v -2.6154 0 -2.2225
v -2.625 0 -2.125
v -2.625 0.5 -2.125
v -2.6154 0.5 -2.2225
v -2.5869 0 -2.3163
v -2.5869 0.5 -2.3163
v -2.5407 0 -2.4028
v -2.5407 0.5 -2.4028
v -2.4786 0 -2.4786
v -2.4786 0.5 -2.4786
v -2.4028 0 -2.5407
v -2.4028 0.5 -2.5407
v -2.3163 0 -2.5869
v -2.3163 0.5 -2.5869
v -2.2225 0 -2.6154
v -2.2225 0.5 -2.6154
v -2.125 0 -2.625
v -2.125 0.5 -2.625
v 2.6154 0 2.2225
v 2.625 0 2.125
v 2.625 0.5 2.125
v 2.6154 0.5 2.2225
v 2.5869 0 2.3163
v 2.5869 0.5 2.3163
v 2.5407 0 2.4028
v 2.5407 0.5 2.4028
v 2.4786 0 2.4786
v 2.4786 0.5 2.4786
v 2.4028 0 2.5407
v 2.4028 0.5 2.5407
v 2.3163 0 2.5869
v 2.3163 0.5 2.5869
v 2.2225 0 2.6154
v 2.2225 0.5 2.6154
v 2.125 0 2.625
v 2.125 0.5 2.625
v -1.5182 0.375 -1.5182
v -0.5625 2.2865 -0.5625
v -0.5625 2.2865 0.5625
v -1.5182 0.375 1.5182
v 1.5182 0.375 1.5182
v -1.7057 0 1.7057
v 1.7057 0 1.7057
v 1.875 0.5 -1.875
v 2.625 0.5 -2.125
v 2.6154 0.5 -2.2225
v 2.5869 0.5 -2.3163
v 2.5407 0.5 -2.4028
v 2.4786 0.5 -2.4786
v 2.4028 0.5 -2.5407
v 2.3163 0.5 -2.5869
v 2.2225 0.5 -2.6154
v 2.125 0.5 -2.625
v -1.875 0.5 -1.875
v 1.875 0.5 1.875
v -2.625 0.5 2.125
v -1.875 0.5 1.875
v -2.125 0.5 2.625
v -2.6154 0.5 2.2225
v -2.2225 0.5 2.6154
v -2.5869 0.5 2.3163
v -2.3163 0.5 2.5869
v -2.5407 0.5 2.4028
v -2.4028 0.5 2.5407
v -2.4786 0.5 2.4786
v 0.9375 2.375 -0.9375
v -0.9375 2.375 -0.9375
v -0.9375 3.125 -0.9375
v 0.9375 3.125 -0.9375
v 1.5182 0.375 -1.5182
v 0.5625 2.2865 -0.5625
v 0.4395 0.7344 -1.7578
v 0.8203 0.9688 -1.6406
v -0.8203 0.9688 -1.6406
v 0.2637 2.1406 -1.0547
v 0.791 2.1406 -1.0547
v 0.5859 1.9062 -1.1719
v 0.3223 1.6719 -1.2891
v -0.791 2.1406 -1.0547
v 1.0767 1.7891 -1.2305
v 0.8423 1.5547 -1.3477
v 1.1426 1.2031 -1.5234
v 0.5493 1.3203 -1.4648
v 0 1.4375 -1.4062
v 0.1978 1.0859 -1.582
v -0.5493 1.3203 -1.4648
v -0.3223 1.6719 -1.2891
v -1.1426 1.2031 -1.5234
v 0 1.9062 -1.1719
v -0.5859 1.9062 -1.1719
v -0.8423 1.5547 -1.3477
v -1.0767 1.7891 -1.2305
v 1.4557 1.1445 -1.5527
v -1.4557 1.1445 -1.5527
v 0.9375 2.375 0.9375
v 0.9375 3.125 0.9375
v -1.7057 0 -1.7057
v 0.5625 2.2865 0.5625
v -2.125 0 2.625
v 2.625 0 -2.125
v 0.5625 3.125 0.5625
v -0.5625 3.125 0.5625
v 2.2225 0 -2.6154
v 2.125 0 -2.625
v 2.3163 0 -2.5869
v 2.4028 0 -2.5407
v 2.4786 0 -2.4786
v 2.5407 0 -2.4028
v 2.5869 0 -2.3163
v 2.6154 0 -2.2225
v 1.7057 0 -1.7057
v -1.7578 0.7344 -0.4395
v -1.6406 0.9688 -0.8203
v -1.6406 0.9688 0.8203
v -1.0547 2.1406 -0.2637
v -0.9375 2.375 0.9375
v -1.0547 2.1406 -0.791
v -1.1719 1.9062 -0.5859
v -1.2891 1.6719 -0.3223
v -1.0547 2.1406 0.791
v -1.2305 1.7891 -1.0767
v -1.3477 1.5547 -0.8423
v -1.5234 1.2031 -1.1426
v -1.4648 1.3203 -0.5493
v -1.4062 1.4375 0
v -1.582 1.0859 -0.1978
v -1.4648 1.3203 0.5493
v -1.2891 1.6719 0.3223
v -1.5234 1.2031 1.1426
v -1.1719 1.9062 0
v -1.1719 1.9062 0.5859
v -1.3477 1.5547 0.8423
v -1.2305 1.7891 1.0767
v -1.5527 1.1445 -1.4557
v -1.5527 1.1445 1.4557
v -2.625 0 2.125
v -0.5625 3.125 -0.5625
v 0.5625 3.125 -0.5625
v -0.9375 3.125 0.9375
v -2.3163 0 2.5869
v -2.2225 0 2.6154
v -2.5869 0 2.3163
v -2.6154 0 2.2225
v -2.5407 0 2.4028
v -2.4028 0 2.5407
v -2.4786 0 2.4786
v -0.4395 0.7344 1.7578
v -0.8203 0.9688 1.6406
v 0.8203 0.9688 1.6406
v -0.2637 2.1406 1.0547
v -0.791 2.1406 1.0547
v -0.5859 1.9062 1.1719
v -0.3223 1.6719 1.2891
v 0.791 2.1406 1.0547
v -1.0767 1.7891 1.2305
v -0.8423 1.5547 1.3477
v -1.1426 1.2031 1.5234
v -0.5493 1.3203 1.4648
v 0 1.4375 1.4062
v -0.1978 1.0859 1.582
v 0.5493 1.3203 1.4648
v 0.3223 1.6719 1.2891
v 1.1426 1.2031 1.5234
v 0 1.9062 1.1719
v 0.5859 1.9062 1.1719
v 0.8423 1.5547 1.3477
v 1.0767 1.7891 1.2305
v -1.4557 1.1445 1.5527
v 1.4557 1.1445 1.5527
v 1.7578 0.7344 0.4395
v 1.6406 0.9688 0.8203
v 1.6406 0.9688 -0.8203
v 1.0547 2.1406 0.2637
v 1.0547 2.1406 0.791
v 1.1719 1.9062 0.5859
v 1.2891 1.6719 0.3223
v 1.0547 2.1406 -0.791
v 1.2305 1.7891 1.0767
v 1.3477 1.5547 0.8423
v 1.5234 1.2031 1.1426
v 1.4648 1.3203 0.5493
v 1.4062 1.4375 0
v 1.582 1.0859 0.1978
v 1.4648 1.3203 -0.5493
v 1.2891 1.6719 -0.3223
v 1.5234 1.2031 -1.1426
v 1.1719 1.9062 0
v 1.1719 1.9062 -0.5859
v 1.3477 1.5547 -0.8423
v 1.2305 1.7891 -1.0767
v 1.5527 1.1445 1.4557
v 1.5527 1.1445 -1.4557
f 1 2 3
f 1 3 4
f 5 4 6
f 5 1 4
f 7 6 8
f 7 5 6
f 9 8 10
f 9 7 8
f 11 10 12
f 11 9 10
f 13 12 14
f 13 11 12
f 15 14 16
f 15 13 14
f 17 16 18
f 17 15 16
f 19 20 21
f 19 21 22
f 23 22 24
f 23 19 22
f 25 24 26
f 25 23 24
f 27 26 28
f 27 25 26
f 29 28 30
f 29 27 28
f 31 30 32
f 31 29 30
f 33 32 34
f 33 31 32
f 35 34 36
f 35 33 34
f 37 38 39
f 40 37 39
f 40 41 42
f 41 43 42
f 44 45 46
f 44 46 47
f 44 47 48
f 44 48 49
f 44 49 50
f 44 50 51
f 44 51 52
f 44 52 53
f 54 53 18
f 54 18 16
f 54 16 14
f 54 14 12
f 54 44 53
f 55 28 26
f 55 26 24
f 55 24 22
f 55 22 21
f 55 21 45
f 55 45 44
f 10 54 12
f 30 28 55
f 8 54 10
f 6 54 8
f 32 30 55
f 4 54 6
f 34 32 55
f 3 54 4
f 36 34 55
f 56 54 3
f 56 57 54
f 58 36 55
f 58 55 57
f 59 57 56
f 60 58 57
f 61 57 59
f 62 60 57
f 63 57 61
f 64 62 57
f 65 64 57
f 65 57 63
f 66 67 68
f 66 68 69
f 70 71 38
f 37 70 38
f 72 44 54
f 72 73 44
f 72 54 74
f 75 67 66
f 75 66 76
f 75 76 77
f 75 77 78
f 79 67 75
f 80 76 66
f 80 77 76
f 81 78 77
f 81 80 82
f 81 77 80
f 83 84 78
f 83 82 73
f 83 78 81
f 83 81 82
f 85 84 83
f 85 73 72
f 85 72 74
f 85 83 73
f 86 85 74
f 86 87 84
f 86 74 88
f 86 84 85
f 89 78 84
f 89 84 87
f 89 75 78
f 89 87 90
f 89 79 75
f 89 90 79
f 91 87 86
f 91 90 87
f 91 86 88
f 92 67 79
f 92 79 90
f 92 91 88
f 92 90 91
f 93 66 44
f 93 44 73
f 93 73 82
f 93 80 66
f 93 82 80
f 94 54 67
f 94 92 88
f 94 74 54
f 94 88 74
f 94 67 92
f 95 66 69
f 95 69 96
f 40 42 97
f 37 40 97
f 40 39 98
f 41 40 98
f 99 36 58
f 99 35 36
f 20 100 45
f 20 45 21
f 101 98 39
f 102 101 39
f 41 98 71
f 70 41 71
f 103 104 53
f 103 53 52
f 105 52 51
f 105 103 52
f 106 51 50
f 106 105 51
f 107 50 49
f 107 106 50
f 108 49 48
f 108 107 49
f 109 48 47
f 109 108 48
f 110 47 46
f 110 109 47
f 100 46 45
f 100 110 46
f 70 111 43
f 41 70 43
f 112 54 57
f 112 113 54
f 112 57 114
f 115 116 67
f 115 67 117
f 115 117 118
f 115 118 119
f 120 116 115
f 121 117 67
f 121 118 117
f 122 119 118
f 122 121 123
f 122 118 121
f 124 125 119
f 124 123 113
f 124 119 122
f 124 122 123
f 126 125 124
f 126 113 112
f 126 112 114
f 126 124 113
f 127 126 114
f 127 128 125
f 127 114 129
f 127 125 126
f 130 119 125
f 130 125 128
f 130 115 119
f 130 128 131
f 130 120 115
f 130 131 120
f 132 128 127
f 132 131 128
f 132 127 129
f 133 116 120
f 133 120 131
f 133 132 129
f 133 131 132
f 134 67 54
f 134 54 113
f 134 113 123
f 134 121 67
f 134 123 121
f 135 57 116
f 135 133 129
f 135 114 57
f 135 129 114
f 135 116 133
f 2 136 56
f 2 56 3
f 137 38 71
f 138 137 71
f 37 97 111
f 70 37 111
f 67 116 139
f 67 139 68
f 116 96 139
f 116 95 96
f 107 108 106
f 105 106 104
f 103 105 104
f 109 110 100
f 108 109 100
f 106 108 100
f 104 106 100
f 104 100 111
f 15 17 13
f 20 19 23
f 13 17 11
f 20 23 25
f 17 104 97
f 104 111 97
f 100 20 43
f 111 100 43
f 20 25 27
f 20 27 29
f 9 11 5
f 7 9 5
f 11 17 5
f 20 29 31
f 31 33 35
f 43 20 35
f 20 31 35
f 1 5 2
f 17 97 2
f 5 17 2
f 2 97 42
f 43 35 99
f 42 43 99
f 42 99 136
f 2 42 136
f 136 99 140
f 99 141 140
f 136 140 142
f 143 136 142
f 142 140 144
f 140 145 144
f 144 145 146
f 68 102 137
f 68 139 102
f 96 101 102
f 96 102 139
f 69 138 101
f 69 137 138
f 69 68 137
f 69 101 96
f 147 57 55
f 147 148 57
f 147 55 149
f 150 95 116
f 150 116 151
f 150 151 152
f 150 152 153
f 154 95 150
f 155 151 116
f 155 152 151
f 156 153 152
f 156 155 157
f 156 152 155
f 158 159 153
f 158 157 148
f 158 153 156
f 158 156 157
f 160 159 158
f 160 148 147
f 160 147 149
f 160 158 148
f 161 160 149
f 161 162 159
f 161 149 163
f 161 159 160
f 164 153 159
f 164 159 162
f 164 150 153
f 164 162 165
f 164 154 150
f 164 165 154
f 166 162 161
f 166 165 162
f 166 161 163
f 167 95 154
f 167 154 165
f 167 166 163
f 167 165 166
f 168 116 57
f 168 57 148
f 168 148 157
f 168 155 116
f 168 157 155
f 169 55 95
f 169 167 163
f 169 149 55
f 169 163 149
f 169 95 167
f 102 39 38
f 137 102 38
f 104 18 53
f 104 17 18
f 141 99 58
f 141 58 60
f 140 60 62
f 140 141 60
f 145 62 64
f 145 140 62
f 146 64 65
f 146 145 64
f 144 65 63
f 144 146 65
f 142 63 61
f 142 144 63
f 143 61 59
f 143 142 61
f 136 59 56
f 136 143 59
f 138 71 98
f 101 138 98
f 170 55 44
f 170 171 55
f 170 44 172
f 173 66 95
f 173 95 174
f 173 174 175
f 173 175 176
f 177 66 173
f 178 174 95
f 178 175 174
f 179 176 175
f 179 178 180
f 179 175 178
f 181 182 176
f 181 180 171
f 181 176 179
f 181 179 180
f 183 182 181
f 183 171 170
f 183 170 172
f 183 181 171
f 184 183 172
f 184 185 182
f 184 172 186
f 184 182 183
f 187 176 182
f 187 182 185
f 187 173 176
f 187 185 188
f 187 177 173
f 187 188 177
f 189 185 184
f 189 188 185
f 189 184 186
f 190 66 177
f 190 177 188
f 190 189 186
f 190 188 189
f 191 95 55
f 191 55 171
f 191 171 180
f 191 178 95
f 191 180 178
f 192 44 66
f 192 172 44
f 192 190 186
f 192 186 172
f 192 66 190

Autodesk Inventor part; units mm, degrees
ref_plane "YZ Plane" through (0, 0, 0) normal (1, 0, 0) x (0, 1, 0)
ref_plane "XZ Plane" through (0, 0, 0) normal (0, 1, 0) x (-1, 0, 0)
sketch "Boceto1" plane through (0, 0, 0) normal (0, 1, 0) x (-1, 0, 0)
  line L0 (-2.125, 2.625) -> (2.125, 2.625)
  line L1 (2.625, 2.125) -> (2.625, -2.125)
  line L2 (2.125, -2.625) -> (-2.125, -2.625)
  line L3 (-2.625, -2.125) -> (-2.625, 2.125)
  line L4 (-2.625, 2.625) -> (2.625, -2.625) construction
  line L5 (2.625, 2.625) -> (-2.625, -2.625) construction
  arc A0 (2.625, 2.125) -> (2.125, 2.625) centre (2.125, 2.125) ccw
  arc A1 (2.125, -2.625) -> (2.625, -2.125) centre (2.125, -2.125) ccw
  arc A2 (-2.625, -2.125) -> (-2.125, -2.625) centre (-2.125, -2.125) ccw
  arc A3 (-2.125, 2.625) -> (-2.625, 2.125) centre (-2.125, 2.125) ccw
  point P0 (0, 0)
  point P1 (0, -2.625)
  dimension "d0" = 0.5
  dimension "d1" = 5.25
  dimension "d2" = 5.25
extrude "Extrusión1" add sketch "Boceto1" along normal blind 0.5
sketch "Boceto2" plane through (0, 0.5, 0) normal (0, 1, 0) x (1, 0, 0)
  line L0 (1.875, -1.875) -> (-1.875, -1.875)
  line L1 (-1.875, -1.875) -> (-1.875, 1.875)
  line L2 (-1.875, 1.875) -> (1.875, 1.875)
  line L3 (1.875, 1.875) -> (1.875, -1.875)
  line L4 (1.875, -1.875) -> (-1.875, 1.875) construction
  line L5 (-1.875, -1.875) -> (1.875, 1.875) construction
  point P0 (0, 0)
  dimension "d5" = 3.75
  dimension "d6" = 3.75
ref_plane "Plano de trabajo1" through (0, 2.375, 0) normal (0, 1, 0) x (1, 0, 0)
sketch "Boceto3" plane through (0, 2.375, 0) normal (0, 1, 0) x (1, 0, 0)
  line L0 (0.9375, -0.9375) -> (-0.9375, -0.9375)
  line L1 (-0.9375, -0.9375) -> (-0.9375, 0.9375)
  line L2 (-0.9375, 0.9375) -> (0.9375, 0.9375)
  line L3 (0.9375, 0.9375) -> (0.9375, -0.9375)
  line L4 (0.9375, -0.9375) -> (-0.9375, 0.9375) construction
  line L5 (-0.9375, -0.9375) -> (0.9375, 0.9375) construction
  point P0 (0, 0)
  dimension "d8" = 1.875
  dimension "d9" = 1.875
loft "Solevación1" add profiles "Boceto2", "Boceto3"
sketch "Boceto4" plane through (-0.9375, 2.375, 0.9375) normal (0, 1, 0) x (1, 0, 0)
  line L0 (1.875, 0) -> (0, 0) projected
  line L1 (1.875, 1.875) -> (1.875, 0) projected
  line L2 (0, 1.875) -> (1.875, 1.875) projected
  line L3 (0, 0) -> (0, 1.875) projected
  point P0 (0.9375, 0.9375)
extrude "Extrusión2" add sketch "Boceto4" along normal blind 0.75
shell "Vaciado5" thickness 0.375 removed faces 1 at (0.3125, 3.125, 0.3125)
sketch "Boceto11" plane through (0, 0, 0) normal (0, 0, 1) x (1, 0, 0)
  line L0 (1.5182, 0.375) -> (0.5625, 2.2865) projected
  line L1 (-1.5182, 0.375) -> (-0.5625, 2.2865) projected
  line L2 (1.5182, 0.375) -> (1.7057, 0)
  line L3 (-1.5182, 0.375) -> (-1.7057, 0)
  line L4 (1.7057, 0) -> (-1.7057, 0)
  point P0 (0, 0)
  point P1 (-2.625, 0)
sketch "Boceto10" plane through (0, 0, 0) normal (0, -1, 0) x (1, 0, 0)
  line L0 (1.7057, 1.7057) -> (-1.7057, 1.7057)
  line L1 (-1.7057, 1.7057) -> (-1.7057, -1.7057)
  line L2 (-1.7057, -1.7057) -> (1.7057, -1.7057)
  line L3 (1.7057, -1.7057) -> (1.7057, 1.7057)
  line L4 (1.7057, 1.7057) -> (-1.7057, -1.7057) construction
  line L5 (-1.7057, 1.7057) -> (1.7057, -1.7057) construction
  point P0 (0, 0)
  point P1 (-1.7057, 0)
  point P2 (-1.7057, 0)
sketch "Boceto12" plane through (-1.5182, 0.375, -1.5182) normal (0, 1, 0) x (1, 0, 0)
  line L0 (3.0365, -3.0365) -> (3.0365, 0) projected
  line L1 (3.0365, 0) -> (0, 0) projected
  line L2 (0, 0) -> (0, -3.0365) projected
  line L3 (0, -3.0365) -> (3.0365, -3.0365) projected
  point P0 (1.5182, -1.5182)
loft "Solevación3" cut profiles "Boceto10" section 1 edges at (1.5182, 0.375, 0) (0, 0.375, -1.5182) (-1.5182, 0.375, 0) (0, 0.375, 1.5182)
equation "\"d2\" = d1"
equation "\"d6\" = d5"
equation "\"d9\" = d8"
properties part number "ejercicio_clase_5"
